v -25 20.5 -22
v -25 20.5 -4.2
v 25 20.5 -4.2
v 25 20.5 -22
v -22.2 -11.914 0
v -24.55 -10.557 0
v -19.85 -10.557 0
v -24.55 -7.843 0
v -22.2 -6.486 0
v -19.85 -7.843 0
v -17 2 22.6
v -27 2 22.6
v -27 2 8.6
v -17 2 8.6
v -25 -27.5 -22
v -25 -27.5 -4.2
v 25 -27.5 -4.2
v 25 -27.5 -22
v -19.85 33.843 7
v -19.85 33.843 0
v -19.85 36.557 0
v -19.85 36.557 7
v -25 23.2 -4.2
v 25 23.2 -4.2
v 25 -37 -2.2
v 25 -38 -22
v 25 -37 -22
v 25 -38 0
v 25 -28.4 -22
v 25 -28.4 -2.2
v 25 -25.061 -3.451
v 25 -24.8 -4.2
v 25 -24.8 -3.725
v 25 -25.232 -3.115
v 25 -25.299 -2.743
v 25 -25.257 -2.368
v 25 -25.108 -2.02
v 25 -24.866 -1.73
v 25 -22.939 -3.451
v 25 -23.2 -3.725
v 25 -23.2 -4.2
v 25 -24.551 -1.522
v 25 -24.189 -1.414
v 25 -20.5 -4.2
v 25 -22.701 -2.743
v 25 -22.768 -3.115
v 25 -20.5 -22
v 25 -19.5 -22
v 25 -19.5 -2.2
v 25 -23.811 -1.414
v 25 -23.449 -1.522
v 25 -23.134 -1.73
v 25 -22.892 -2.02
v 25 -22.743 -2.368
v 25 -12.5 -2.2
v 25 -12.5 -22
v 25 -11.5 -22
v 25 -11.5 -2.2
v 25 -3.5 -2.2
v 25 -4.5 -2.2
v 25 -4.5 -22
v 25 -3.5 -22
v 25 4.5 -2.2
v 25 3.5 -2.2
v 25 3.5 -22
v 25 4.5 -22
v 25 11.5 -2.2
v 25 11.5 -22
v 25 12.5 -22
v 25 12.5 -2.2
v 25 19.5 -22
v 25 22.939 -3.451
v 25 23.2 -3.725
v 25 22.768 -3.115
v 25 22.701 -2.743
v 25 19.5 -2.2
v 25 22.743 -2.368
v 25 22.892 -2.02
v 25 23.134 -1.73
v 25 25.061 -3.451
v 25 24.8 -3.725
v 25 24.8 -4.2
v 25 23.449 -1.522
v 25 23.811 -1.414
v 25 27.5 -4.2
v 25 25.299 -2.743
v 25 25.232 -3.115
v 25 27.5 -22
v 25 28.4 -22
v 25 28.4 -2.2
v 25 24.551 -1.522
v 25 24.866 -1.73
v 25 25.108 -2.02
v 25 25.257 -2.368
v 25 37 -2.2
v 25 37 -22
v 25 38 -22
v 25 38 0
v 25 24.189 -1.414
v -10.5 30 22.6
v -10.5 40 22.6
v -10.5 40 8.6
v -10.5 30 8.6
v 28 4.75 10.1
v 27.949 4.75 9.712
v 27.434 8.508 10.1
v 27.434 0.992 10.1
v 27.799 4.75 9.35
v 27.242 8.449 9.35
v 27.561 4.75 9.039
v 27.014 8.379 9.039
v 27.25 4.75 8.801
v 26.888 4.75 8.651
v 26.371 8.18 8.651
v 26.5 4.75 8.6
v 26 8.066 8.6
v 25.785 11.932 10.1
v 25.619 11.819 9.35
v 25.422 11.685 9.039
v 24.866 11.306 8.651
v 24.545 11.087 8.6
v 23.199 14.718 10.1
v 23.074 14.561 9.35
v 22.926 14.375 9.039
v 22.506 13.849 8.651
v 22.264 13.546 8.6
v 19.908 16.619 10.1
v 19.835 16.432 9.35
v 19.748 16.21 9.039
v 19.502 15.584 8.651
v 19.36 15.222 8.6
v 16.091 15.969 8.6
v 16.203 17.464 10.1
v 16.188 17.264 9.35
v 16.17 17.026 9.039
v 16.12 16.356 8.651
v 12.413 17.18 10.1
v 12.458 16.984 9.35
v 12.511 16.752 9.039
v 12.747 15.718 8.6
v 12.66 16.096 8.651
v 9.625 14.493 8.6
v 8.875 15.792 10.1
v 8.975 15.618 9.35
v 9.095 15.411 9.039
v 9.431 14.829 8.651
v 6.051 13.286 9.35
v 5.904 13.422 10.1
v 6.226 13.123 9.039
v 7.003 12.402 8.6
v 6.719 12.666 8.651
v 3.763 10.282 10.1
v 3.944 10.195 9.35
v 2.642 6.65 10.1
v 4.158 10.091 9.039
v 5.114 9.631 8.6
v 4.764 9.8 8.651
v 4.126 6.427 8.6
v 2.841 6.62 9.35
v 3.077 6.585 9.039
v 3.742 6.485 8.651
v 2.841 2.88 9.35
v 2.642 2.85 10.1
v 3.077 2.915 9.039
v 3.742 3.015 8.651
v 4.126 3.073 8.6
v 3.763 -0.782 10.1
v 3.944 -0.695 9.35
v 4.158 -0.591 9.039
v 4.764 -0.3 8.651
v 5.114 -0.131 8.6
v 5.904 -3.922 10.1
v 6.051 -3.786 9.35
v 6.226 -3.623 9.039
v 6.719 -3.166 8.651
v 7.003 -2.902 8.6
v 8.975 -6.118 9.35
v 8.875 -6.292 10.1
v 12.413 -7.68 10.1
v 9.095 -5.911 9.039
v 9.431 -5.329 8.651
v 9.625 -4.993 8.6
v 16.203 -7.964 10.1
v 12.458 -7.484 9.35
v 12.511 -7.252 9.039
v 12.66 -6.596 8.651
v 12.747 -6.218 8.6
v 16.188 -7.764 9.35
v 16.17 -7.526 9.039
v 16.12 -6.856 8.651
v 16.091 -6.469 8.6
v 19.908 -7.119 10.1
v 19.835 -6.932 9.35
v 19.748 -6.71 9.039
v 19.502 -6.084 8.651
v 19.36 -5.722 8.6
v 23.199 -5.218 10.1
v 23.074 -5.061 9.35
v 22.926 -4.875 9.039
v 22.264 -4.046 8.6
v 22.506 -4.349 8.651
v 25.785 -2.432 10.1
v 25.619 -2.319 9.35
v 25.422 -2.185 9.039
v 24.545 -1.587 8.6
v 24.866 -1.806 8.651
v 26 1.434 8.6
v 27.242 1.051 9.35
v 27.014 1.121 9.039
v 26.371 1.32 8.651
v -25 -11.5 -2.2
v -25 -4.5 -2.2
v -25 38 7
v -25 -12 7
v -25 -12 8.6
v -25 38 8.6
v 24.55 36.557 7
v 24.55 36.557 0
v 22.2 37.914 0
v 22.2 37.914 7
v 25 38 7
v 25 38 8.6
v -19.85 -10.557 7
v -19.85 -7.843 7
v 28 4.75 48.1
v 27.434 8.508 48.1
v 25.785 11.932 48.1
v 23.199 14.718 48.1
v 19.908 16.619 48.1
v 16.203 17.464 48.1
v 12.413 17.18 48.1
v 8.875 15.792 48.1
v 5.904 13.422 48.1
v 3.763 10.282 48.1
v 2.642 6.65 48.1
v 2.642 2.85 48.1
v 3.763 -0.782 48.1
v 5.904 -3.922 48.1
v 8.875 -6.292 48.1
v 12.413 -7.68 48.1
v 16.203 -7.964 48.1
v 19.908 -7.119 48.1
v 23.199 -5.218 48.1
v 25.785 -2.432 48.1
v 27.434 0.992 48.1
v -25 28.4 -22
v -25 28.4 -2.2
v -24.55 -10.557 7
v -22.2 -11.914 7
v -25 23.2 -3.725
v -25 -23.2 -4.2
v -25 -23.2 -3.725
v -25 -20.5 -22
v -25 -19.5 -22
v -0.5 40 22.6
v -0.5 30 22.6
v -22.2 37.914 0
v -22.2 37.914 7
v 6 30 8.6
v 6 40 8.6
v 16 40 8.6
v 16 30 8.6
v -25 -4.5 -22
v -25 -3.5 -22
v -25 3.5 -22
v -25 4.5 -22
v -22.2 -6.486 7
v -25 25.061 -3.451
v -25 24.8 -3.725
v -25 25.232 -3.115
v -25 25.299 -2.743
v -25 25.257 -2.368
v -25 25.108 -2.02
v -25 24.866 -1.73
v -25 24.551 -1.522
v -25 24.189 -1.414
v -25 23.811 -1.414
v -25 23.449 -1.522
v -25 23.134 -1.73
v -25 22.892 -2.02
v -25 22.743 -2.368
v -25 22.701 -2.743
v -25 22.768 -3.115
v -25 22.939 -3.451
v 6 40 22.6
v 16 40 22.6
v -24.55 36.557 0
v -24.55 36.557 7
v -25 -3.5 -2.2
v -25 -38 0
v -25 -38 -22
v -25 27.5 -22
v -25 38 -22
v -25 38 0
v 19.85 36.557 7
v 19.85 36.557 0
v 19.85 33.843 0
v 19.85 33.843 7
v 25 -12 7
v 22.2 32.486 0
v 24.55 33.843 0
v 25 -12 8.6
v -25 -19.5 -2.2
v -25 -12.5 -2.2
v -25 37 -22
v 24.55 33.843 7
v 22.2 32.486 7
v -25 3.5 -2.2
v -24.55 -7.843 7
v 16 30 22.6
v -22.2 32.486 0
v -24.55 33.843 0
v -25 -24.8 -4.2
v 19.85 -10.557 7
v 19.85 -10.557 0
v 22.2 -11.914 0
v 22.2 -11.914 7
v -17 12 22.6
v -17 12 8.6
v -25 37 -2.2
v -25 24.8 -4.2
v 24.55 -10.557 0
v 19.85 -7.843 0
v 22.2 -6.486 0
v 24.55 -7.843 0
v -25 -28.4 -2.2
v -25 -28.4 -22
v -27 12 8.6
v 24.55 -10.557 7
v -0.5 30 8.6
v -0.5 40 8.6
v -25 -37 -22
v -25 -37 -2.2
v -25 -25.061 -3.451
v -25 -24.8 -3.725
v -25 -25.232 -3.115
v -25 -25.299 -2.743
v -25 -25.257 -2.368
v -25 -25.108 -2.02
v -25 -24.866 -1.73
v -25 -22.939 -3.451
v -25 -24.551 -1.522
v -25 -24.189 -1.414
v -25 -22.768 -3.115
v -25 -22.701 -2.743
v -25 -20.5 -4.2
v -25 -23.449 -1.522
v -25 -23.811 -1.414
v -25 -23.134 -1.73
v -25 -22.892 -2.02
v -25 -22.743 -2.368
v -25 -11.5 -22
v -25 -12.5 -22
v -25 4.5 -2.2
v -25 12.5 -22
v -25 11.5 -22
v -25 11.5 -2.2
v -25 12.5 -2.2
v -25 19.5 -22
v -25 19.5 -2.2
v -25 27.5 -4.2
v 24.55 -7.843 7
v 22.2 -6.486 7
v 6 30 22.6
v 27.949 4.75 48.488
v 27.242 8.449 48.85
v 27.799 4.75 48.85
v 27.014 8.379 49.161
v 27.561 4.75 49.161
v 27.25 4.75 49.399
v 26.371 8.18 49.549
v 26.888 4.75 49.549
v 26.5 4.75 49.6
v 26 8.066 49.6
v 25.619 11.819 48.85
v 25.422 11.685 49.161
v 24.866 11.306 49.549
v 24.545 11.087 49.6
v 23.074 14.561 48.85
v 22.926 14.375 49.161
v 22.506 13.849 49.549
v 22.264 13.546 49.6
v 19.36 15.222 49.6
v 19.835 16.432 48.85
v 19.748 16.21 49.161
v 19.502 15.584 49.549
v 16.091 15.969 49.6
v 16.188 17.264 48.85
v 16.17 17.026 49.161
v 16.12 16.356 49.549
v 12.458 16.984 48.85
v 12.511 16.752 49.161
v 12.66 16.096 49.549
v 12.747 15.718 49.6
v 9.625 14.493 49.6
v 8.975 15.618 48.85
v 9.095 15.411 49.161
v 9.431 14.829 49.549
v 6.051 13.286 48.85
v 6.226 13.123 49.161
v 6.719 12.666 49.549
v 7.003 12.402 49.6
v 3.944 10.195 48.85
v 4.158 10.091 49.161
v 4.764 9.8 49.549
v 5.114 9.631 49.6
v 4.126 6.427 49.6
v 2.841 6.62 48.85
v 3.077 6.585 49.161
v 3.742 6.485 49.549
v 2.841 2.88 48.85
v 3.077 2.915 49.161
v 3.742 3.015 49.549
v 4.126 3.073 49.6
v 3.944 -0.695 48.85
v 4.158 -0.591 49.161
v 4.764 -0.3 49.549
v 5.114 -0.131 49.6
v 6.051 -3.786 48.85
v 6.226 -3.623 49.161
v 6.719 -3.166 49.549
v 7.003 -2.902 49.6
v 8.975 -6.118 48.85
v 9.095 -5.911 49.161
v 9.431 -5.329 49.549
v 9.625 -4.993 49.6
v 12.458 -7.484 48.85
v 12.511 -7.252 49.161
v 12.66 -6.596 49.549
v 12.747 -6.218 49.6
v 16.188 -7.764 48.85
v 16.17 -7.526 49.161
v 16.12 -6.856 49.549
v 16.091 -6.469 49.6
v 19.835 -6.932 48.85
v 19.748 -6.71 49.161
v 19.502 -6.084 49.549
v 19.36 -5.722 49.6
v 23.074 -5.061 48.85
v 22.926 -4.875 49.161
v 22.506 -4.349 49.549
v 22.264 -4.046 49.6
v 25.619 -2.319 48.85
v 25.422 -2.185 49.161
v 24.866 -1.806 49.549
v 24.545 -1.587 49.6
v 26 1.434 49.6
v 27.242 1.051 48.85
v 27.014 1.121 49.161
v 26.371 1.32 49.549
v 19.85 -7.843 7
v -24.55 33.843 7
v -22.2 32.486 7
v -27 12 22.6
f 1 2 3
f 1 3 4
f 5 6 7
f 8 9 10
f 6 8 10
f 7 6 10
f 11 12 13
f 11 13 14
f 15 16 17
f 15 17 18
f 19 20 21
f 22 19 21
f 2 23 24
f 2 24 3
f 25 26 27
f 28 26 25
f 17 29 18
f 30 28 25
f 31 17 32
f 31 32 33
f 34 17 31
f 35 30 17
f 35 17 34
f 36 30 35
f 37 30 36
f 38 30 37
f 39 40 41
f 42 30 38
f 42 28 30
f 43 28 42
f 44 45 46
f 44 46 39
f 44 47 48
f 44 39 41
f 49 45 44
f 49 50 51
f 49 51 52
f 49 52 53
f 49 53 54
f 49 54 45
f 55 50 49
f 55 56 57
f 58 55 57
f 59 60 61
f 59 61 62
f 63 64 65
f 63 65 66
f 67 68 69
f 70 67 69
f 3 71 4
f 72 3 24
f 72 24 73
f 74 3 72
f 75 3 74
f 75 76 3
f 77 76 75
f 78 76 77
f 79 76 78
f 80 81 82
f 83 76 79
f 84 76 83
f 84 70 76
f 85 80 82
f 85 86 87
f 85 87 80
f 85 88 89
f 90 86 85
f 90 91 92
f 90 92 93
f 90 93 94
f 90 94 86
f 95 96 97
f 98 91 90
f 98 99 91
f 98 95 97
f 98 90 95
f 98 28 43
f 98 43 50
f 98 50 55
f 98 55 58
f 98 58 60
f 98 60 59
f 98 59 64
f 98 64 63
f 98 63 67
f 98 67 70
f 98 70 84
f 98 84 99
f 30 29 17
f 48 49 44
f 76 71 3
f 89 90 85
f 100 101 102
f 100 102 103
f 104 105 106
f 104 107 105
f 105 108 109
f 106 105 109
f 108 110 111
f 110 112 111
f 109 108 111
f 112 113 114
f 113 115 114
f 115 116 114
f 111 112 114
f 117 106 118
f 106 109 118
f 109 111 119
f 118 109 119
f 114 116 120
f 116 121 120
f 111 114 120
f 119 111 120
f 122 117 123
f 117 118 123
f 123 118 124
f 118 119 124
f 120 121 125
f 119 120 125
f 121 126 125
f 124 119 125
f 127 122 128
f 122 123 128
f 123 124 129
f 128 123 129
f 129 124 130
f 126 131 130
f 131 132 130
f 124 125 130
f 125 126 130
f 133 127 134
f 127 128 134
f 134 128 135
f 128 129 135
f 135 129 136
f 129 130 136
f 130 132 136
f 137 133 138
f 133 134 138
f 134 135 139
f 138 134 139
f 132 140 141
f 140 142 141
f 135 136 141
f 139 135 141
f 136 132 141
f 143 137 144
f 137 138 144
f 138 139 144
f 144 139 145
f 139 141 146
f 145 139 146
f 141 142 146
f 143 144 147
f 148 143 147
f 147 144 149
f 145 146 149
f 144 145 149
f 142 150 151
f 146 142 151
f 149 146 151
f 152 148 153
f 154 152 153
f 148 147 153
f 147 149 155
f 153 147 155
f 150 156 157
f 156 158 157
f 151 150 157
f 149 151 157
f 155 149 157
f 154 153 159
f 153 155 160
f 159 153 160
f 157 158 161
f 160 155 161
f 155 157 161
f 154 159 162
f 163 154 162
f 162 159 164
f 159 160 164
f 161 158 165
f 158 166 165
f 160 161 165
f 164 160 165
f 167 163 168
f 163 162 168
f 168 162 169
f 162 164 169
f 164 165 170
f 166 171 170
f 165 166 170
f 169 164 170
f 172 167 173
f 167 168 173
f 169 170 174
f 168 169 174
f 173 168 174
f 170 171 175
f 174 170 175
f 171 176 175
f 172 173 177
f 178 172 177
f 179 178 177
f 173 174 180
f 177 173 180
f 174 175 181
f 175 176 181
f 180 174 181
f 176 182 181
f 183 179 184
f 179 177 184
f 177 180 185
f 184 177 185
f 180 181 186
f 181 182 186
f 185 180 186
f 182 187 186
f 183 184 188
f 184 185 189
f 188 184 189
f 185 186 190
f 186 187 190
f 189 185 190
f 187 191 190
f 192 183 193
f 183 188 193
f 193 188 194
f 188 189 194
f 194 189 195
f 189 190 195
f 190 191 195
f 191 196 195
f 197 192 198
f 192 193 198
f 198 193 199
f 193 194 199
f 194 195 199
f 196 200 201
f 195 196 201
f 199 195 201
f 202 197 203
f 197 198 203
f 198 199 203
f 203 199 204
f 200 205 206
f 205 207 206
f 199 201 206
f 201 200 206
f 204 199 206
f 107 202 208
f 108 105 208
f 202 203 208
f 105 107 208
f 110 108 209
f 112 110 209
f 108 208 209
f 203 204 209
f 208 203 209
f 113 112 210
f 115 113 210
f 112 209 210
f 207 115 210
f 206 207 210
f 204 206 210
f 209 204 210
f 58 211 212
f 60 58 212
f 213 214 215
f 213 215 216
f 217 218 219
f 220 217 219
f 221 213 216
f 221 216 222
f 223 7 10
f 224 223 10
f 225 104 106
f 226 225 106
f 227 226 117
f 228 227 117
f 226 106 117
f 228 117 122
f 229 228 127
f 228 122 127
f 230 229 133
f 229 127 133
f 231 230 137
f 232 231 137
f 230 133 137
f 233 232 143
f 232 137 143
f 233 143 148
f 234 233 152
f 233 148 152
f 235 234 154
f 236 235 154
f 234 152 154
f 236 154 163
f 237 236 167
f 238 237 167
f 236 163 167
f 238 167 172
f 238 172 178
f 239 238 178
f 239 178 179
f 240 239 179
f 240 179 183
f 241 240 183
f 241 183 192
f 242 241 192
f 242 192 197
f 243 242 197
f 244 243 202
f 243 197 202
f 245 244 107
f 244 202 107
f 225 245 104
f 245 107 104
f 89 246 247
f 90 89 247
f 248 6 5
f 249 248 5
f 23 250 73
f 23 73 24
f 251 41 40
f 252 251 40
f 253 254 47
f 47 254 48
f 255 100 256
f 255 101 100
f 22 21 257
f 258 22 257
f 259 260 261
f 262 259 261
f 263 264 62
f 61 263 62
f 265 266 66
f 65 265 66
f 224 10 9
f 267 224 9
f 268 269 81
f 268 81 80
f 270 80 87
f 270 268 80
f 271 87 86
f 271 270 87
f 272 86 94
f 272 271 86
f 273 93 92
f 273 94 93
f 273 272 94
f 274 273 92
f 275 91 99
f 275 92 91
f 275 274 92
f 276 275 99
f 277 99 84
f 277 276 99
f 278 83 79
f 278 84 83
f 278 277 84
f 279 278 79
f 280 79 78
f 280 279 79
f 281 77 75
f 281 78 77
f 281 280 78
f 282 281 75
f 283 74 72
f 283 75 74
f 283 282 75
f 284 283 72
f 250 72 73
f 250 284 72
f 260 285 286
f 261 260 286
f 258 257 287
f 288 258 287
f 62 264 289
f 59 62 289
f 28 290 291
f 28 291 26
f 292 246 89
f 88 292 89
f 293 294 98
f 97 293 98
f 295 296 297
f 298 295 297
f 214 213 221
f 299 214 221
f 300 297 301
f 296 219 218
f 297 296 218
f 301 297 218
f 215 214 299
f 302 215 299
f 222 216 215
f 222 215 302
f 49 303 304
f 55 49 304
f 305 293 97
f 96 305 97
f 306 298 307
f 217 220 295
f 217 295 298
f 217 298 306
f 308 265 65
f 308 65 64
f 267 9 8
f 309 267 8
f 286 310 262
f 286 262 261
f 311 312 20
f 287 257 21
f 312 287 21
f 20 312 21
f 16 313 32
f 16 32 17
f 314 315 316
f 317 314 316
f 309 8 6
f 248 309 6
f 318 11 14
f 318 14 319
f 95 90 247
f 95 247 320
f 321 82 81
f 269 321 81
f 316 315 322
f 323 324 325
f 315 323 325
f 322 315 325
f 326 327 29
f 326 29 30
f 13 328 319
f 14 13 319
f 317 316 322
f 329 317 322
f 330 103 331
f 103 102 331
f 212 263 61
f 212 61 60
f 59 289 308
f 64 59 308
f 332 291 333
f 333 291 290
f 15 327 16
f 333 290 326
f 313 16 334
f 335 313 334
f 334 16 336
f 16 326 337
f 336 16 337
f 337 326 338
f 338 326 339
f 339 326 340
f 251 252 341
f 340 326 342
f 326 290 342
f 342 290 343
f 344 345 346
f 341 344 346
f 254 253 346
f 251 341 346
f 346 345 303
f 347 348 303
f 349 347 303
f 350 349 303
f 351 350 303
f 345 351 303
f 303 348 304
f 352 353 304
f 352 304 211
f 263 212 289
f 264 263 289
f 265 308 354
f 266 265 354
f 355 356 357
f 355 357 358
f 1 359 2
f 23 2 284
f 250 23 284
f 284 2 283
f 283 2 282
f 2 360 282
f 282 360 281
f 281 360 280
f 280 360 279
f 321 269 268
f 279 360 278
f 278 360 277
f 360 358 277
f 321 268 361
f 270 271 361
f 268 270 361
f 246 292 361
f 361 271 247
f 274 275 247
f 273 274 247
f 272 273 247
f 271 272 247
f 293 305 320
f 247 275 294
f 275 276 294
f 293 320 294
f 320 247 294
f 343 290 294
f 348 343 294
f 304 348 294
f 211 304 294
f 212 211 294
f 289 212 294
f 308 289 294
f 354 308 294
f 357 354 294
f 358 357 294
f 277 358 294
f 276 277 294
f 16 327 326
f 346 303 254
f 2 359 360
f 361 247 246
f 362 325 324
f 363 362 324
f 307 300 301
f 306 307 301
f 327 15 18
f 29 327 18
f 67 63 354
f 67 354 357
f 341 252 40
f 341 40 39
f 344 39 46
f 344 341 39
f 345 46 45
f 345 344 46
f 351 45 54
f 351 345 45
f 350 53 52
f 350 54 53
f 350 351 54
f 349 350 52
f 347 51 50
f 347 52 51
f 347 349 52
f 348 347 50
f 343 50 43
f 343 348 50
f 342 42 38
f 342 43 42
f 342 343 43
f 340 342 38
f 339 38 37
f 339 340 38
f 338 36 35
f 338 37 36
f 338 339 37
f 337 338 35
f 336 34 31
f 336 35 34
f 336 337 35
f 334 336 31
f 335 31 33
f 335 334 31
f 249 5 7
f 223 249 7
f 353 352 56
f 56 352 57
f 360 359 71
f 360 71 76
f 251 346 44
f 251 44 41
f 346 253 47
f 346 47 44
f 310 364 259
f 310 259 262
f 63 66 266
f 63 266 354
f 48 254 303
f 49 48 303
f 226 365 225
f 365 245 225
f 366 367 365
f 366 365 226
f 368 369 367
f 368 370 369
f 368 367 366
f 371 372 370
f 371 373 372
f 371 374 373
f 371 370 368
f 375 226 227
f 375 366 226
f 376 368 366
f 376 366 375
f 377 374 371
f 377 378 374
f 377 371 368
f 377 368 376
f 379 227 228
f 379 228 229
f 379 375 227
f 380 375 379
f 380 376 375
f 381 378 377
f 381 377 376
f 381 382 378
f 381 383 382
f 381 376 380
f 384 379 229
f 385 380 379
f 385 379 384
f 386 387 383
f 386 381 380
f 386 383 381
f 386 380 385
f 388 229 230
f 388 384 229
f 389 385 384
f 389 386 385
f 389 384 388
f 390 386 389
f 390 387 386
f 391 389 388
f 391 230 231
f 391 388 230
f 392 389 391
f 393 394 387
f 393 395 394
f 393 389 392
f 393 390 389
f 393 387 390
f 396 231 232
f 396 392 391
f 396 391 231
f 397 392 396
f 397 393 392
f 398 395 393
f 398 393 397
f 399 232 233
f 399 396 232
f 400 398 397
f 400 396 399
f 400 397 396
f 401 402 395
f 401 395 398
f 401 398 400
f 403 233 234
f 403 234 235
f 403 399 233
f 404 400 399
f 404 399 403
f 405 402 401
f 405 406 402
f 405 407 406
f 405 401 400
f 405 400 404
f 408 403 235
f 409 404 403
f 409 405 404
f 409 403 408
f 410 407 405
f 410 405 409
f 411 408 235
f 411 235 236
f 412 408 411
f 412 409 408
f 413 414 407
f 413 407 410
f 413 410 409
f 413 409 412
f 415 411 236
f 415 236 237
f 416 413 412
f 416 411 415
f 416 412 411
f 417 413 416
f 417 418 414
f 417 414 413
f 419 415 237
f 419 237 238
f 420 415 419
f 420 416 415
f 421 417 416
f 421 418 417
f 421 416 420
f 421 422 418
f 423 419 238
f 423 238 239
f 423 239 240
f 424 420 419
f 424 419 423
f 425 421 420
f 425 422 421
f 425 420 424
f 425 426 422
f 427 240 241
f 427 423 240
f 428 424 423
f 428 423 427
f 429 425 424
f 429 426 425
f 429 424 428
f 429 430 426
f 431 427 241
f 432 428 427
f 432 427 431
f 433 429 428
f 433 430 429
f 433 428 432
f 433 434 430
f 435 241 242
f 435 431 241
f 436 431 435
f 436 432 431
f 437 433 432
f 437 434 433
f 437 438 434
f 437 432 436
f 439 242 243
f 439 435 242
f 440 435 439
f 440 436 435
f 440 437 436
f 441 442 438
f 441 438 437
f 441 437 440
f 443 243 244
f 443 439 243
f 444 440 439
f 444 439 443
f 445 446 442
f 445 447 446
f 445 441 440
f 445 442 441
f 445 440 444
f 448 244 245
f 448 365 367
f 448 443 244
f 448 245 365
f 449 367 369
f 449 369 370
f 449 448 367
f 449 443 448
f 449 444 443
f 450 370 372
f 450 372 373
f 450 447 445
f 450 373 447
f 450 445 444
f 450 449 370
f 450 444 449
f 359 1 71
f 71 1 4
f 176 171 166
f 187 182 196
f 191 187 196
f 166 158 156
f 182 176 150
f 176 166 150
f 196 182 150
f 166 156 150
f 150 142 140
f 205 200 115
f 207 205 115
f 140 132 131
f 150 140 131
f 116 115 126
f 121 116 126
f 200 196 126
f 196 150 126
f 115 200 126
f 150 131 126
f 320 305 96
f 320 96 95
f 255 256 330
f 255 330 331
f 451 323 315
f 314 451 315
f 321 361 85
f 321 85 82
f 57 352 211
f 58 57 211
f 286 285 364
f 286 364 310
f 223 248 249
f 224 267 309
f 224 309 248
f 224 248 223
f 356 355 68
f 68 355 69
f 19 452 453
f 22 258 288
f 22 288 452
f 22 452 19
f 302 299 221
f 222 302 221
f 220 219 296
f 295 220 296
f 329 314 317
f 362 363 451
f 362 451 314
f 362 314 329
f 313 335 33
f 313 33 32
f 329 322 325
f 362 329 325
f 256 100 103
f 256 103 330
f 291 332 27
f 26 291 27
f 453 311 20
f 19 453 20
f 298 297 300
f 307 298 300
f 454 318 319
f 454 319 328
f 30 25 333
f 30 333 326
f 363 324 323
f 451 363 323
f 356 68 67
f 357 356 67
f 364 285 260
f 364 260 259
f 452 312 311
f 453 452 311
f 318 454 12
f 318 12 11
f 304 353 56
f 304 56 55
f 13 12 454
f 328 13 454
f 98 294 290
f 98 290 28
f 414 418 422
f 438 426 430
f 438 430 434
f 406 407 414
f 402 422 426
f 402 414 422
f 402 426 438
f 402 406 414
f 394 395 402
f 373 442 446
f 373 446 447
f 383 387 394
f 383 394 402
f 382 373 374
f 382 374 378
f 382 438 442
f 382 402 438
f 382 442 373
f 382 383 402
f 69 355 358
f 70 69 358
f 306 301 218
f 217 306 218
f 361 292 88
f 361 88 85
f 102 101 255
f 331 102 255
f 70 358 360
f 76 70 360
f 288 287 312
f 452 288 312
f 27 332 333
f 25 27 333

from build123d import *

# Parameters (mm, degrees)
F0_W      = 50
F0_H      = 76
F1_DEPTH  = 22
F2_W      = 8.6
F2_H      = 19.8
F2_W_2    = 7
F3_DEPTH  = 27.5
F5_DEPTH  = 7
F6_W      = 50
F6_H      = 50
F7_DEPTH  = 1.6
F8_R      = 12.75
F9_DEPTH  = 41
F10_R     = 1.5
F11_W     = 8
F11_H     = 10
F11_W_2   = 2
F12_DEPTH = 14
F11_W_3   = 10
F11_H_2   = 8
F11_H_3   = 2


with BuildPart() as f1:
    # F0 (on Top) → F1 (new body)
    with BuildSketch(Plane.XY):
        Rectangle(F0_W, F0_H)
    extrude(amount=-F1_DEPTH)

    # F2 (on Right) → F3 (cut, symmetric)
    with BuildSketch(Plane.YZ):
        with Locations((-32.7, -12.1)):
            Rectangle(F2_W, F2_H)
        with Locations((0, -12.1)):
            Rectangle(F2_W_2, F2_H)
        with Locations((-8, -12.1)):
            Rectangle(F2_W_2, F2_H)
        with Locations((-16, -12.1)):
            Rectangle(F2_W_2, F2_H)
        with BuildLine():
            Line((-27.5, -4.2), (-27.5, -22))
            Line((-27.5, -22), (-20.5, -22))
            Line((-20.5, -22), (-20.5, -4.2))
            Line((-20.5, -4.2), (-23.2, -4.2))
            Line((-23.2, -4.2), (-23.2, -3.7246950766))
            ThreePointArc((-23.2, -3.7246950766), (-24, -1.4), (-24.8, -3.7246950766))
            Line((-24.8, -3.7246950766), (-24.8, -4.2))
            Line((-24.8, -4.2), (-27.5, -4.2))
        make_face()
        with Locations((32.7, -12.1)):
            Rectangle(F2_W, F2_H)
        with BuildLine():
            Line((20.5, -22), (27.5, -22))
            Line((27.5, -22), (27.5, -4.2))
            Line((27.5, -4.2), (24.8, -4.2))
            Line((24.8, -4.2), (24.8, -3.7246950766))
            ThreePointArc((24.8, -3.7246950766), (24, -1.4), (23.2, -3.7246950766))
            Line((23.2, -3.7246950766), (23.2, -4.2))
            Line((23.2, -4.2), (20.5, -4.2))
            Line((20.5, -4.2), (20.5, -22))
        make_face()
        with Locations((16, -12.1)):
            Rectangle(F2_W_2, F2_H)
        with Locations((8, -12.1)):
            Rectangle(F2_W_2, F2_H)
    extrude(amount=F3_DEPTH, both=True, mode=Mode.SUBTRACT)


with BuildPart() as f5:
    # F4 (on face) → F5 (new body)
    with BuildSketch(Plane.XY):
        Polygon((-24.55, 33.8432268674), (-22.2, 32.4864537348), (-19.85, 33.8432268674), (-19.85, 36.5567731326), (-22.2, 37.9135462652), (-24.55, 36.5567731326), align=None)
    extrude(amount=F5_DEPTH)


with BuildPart() as f5b:
    # F4 (on face) → F5, piece 2 (new body)
    with BuildSketch(Plane.XY):
        Polygon((-19.85, -7.8432268674), (-22.2, -6.4864537348), (-24.55, -7.8432268674), (-24.55, -10.5567731326), (-22.2, -11.9135462652), (-19.85, -10.5567731326), align=None)
    extrude(amount=F5_DEPTH)


with BuildPart() as f5c:
    # F4 (on face) → F5, piece 3 (new body)
    with BuildSketch(Plane.XY):
        Polygon((24.55, 36.5567731326), (22.2, 37.9135462652), (19.85, 36.5567731326), (19.85, 33.8432268674), (22.2, 32.4864537348), (24.55, 33.8432268674), align=None)
    extrude(amount=F5_DEPTH)


with BuildPart() as f5d:
    # F4 (on face) → F5, piece 4 (new body)
    with BuildSketch(Plane.XY):
        Polygon((24.55, -7.8432268674), (22.2, -6.4864537348), (19.85, -7.8432268674), (19.85, -10.5567731326), (22.2, -11.9135462652), (24.55, -10.5567731326), align=None)
    extrude(amount=F5_DEPTH)


with BuildPart() as f7:
    # F6 (on face) → F7 (new body)
    with BuildSketch(Plane.XY.offset(7)):
        with Locations((0, 13)):
            Rectangle(F6_W, F6_H)
        Polygon((-24.55, 33.8432268674), (-24.55, 36.5567731326), (-22.2, 37.9135462652), (-19.85, 36.5567731326), (-19.85, 33.8432268674), (-22.2, 32.4864537348), align=None, mode=Mode.SUBTRACT)
        Polygon((-22.2, 37.9135462652), (-24.55, 36.5567731326), (-24.55, 33.8432268674), (-22.2, 32.4864537348), (-19.85, 33.8432268674), (-19.85, 36.5567731326), align=None)
    extrude(amount=F7_DEPTH)


with BuildPart() as f9:
    # F8 (on face) → F9 (new body)
    with BuildSketch(Plane.XY.offset(8.6)):
        with Locations((15.25, 4.75)):
            Circle(F8_R)
    extrude(amount=F9_DEPTH)

    # F10
    f10_edges = [f9.edges().sort_by_distance(p)[0] for p in [
        (2.5, 4.75, 49.6),
        (2.5, 4.75, 8.6),
    ]]
    fillet(f10_edges, radius=F10_R)


with BuildPart() as f12:
    # F11 (on face) → F12 (new body)
    with BuildSketch(Plane.XY.offset(8.6)):
        with Locations((-21, 7)):
            Rectangle(F11_W, F11_H)
        with Locations((-26, 7)):
            Rectangle(F11_W_2, F11_H)
    extrude(amount=F12_DEPTH)


with BuildPart() as f12b:
    # F11 (on face) → F12, piece 2 (new body)
    with BuildSketch(Plane.XY.offset(8.6)):
        with Locations((-5.5, 34)):
            Rectangle(F11_W_3, F11_H_2)
        with Locations((-5.5, 39)):
            Rectangle(F11_W_3, F11_H_3)
    extrude(amount=F12_DEPTH)


with BuildPart() as f12c:
    # F11 (on face) → F12, piece 3 (new body)
    with BuildSketch(Plane.XY.offset(8.6)):
        with Locations((11, 39)):
            Rectangle(F11_W_3, F11_H_3)
        with Locations((11, 34)):
            Rectangle(F11_W_3, F11_H_2)
    extrude(amount=F12_DEPTH)


solid = Compound([f1.part, f5.part, f5b.part, f5c.part, f5d.part, f7.part, f9.part, f12.part, f12b.part, f12c.part])
